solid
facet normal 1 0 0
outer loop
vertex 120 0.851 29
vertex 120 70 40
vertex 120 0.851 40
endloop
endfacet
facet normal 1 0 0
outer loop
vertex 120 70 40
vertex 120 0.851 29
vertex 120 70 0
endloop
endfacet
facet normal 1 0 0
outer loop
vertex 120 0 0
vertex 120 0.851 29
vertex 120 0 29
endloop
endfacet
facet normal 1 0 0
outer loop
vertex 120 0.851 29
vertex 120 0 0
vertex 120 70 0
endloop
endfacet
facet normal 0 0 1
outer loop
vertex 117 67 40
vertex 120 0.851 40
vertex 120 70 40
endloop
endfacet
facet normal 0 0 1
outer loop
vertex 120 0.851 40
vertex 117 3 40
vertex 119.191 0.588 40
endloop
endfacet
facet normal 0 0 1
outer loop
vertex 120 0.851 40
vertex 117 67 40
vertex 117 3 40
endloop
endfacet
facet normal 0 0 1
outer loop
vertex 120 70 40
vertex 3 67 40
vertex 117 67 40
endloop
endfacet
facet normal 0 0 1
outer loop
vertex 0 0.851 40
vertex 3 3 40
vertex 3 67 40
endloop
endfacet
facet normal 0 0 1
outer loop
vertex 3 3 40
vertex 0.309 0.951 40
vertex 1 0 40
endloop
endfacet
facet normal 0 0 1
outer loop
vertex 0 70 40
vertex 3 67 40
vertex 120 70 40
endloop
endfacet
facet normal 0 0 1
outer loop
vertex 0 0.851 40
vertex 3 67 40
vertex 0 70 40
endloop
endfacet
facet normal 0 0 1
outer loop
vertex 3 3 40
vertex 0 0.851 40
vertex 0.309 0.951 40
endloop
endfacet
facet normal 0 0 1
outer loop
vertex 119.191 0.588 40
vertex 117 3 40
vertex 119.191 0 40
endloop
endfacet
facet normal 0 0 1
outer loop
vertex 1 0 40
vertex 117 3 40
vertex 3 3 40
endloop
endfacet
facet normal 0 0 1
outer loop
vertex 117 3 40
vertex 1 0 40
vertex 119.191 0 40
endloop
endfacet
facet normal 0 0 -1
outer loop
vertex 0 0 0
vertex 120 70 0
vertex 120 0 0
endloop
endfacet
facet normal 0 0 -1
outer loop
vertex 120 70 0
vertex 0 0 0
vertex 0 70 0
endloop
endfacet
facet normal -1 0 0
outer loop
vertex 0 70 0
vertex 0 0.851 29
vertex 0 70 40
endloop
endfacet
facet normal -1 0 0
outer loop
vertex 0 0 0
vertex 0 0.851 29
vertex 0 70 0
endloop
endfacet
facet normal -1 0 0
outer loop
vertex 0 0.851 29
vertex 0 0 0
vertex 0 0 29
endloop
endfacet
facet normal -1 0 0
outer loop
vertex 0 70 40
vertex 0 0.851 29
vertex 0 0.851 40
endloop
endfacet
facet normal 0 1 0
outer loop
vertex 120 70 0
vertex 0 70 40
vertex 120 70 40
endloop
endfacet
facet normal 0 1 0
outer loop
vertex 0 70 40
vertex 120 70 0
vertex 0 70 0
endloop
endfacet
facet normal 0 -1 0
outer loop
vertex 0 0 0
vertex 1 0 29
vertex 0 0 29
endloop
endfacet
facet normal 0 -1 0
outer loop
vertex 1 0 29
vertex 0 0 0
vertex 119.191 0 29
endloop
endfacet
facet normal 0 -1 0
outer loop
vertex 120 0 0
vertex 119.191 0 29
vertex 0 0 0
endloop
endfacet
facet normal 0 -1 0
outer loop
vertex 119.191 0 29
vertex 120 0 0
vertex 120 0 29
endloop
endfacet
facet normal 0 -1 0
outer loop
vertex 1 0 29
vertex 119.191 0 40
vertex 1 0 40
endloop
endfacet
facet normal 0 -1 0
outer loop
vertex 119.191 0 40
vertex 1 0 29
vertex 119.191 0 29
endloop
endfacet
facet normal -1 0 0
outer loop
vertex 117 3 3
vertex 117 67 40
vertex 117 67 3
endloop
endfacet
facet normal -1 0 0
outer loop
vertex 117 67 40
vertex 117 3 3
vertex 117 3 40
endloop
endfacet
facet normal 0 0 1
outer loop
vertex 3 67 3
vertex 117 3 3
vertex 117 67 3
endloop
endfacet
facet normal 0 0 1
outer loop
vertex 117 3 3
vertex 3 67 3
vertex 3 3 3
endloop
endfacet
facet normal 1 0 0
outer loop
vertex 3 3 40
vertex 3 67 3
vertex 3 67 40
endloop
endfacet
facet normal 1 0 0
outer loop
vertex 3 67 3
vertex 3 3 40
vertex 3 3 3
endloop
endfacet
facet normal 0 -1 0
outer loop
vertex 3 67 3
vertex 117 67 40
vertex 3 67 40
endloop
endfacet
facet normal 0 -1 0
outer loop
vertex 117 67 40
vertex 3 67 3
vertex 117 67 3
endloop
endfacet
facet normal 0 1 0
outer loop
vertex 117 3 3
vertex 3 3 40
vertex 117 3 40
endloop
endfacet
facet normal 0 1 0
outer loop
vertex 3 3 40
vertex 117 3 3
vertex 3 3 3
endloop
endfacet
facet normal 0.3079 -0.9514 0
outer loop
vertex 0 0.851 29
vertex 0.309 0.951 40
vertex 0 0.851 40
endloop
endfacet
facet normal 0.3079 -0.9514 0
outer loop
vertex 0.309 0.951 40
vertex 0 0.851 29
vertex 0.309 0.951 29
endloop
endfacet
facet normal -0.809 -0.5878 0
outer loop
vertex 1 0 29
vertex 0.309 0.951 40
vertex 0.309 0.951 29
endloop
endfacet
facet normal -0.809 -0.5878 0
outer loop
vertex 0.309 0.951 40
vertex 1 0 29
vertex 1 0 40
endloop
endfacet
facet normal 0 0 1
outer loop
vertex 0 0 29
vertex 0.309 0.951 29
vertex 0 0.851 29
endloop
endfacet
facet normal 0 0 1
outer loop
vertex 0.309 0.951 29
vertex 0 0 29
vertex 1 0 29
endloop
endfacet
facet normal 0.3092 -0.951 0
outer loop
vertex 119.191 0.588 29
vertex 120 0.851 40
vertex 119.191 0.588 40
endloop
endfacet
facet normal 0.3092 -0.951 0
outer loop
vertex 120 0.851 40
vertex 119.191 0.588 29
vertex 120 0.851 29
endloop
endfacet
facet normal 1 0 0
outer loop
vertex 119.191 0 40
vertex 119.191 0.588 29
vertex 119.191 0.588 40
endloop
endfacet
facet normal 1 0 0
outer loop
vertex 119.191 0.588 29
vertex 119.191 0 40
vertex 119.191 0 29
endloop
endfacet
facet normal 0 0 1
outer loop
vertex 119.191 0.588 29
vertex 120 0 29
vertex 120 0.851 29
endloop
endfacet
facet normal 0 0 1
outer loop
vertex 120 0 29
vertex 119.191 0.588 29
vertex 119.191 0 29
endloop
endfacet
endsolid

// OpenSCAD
// --- Buffer tank for mini horizontal gel-electrophoresis box ---
// Print orientation: resting on XY plane at z = 0, building upward (+Z)

// Outer dimensions
outer_x = 120;   // mm, X direction
outer_y = 70;    // mm, Y direction
outer_z = 40;    // mm, Z direction

// Wall and floor thickness
wall_thick = 3;  // mm
floor_thick = 3; // mm

// Platform dimensions
platform_length = 60;  // mm, X direction (centred)
platform_top_z = 13;   // mm, top of platform above inner floor

// Electrode wire holes
hole_dia = 2;    // mm, diameter
hole_z = 30;     // mm, height of hole centre

// --- Derived dimensions ---
inner_x = outer_x - 2 * wall_thick;
inner_y = outer_y - 2 * wall_thick;
inner_z = outer_z - floor_thick;

platform_x_start = (inner_x - platform_length) / 2;
platform_y_start = 0; // spans full inner Y
platform_y_end = inner_y;
platform_height = platform_top_z - floor_thick;

// --- Build the part ---
difference() {
    // Outer shell (solid block)
    union() {
        // Main outer box
        cube([outer_x, outer_y, outer_z], center = false);
    }
    
    // Hollow out the interior
    translate([wall_thick, wall_thick, floor_thick]) {
        cube([inner_x, inner_y, inner_z], center = false);
    }
    
    // Platform (solid raised section)
    translate([
        wall_thick + platform_x_start,
        wall_thick + platform_y_start,
        floor_thick
    ]) {
        cube([
            platform_length,
            platform_y_end - platform_y_start,
            platform_height
        ], center = false);
    }
    
    // Electrode wire holes (through end walls)
    // Left end wall hole
    translate([
        0,  // X: starts at left edge
        0,  // Y: centred
        hole_z - hole_dia / 2
    ]) {
        cylinder(
            d = hole_dia,
            h = outer_x + 0.01,  // extend past both walls
            center = false
        );
    }
    
    // Right end wall hole
    translate([
        outer_x,  // X: starts at right edge
        0,
        hole_z - hole_dia / 2
    ]) {
        cylinder(
            d = hole_dia,
            h = outer_x + 0.01,
            center = false
        );
    }
}
